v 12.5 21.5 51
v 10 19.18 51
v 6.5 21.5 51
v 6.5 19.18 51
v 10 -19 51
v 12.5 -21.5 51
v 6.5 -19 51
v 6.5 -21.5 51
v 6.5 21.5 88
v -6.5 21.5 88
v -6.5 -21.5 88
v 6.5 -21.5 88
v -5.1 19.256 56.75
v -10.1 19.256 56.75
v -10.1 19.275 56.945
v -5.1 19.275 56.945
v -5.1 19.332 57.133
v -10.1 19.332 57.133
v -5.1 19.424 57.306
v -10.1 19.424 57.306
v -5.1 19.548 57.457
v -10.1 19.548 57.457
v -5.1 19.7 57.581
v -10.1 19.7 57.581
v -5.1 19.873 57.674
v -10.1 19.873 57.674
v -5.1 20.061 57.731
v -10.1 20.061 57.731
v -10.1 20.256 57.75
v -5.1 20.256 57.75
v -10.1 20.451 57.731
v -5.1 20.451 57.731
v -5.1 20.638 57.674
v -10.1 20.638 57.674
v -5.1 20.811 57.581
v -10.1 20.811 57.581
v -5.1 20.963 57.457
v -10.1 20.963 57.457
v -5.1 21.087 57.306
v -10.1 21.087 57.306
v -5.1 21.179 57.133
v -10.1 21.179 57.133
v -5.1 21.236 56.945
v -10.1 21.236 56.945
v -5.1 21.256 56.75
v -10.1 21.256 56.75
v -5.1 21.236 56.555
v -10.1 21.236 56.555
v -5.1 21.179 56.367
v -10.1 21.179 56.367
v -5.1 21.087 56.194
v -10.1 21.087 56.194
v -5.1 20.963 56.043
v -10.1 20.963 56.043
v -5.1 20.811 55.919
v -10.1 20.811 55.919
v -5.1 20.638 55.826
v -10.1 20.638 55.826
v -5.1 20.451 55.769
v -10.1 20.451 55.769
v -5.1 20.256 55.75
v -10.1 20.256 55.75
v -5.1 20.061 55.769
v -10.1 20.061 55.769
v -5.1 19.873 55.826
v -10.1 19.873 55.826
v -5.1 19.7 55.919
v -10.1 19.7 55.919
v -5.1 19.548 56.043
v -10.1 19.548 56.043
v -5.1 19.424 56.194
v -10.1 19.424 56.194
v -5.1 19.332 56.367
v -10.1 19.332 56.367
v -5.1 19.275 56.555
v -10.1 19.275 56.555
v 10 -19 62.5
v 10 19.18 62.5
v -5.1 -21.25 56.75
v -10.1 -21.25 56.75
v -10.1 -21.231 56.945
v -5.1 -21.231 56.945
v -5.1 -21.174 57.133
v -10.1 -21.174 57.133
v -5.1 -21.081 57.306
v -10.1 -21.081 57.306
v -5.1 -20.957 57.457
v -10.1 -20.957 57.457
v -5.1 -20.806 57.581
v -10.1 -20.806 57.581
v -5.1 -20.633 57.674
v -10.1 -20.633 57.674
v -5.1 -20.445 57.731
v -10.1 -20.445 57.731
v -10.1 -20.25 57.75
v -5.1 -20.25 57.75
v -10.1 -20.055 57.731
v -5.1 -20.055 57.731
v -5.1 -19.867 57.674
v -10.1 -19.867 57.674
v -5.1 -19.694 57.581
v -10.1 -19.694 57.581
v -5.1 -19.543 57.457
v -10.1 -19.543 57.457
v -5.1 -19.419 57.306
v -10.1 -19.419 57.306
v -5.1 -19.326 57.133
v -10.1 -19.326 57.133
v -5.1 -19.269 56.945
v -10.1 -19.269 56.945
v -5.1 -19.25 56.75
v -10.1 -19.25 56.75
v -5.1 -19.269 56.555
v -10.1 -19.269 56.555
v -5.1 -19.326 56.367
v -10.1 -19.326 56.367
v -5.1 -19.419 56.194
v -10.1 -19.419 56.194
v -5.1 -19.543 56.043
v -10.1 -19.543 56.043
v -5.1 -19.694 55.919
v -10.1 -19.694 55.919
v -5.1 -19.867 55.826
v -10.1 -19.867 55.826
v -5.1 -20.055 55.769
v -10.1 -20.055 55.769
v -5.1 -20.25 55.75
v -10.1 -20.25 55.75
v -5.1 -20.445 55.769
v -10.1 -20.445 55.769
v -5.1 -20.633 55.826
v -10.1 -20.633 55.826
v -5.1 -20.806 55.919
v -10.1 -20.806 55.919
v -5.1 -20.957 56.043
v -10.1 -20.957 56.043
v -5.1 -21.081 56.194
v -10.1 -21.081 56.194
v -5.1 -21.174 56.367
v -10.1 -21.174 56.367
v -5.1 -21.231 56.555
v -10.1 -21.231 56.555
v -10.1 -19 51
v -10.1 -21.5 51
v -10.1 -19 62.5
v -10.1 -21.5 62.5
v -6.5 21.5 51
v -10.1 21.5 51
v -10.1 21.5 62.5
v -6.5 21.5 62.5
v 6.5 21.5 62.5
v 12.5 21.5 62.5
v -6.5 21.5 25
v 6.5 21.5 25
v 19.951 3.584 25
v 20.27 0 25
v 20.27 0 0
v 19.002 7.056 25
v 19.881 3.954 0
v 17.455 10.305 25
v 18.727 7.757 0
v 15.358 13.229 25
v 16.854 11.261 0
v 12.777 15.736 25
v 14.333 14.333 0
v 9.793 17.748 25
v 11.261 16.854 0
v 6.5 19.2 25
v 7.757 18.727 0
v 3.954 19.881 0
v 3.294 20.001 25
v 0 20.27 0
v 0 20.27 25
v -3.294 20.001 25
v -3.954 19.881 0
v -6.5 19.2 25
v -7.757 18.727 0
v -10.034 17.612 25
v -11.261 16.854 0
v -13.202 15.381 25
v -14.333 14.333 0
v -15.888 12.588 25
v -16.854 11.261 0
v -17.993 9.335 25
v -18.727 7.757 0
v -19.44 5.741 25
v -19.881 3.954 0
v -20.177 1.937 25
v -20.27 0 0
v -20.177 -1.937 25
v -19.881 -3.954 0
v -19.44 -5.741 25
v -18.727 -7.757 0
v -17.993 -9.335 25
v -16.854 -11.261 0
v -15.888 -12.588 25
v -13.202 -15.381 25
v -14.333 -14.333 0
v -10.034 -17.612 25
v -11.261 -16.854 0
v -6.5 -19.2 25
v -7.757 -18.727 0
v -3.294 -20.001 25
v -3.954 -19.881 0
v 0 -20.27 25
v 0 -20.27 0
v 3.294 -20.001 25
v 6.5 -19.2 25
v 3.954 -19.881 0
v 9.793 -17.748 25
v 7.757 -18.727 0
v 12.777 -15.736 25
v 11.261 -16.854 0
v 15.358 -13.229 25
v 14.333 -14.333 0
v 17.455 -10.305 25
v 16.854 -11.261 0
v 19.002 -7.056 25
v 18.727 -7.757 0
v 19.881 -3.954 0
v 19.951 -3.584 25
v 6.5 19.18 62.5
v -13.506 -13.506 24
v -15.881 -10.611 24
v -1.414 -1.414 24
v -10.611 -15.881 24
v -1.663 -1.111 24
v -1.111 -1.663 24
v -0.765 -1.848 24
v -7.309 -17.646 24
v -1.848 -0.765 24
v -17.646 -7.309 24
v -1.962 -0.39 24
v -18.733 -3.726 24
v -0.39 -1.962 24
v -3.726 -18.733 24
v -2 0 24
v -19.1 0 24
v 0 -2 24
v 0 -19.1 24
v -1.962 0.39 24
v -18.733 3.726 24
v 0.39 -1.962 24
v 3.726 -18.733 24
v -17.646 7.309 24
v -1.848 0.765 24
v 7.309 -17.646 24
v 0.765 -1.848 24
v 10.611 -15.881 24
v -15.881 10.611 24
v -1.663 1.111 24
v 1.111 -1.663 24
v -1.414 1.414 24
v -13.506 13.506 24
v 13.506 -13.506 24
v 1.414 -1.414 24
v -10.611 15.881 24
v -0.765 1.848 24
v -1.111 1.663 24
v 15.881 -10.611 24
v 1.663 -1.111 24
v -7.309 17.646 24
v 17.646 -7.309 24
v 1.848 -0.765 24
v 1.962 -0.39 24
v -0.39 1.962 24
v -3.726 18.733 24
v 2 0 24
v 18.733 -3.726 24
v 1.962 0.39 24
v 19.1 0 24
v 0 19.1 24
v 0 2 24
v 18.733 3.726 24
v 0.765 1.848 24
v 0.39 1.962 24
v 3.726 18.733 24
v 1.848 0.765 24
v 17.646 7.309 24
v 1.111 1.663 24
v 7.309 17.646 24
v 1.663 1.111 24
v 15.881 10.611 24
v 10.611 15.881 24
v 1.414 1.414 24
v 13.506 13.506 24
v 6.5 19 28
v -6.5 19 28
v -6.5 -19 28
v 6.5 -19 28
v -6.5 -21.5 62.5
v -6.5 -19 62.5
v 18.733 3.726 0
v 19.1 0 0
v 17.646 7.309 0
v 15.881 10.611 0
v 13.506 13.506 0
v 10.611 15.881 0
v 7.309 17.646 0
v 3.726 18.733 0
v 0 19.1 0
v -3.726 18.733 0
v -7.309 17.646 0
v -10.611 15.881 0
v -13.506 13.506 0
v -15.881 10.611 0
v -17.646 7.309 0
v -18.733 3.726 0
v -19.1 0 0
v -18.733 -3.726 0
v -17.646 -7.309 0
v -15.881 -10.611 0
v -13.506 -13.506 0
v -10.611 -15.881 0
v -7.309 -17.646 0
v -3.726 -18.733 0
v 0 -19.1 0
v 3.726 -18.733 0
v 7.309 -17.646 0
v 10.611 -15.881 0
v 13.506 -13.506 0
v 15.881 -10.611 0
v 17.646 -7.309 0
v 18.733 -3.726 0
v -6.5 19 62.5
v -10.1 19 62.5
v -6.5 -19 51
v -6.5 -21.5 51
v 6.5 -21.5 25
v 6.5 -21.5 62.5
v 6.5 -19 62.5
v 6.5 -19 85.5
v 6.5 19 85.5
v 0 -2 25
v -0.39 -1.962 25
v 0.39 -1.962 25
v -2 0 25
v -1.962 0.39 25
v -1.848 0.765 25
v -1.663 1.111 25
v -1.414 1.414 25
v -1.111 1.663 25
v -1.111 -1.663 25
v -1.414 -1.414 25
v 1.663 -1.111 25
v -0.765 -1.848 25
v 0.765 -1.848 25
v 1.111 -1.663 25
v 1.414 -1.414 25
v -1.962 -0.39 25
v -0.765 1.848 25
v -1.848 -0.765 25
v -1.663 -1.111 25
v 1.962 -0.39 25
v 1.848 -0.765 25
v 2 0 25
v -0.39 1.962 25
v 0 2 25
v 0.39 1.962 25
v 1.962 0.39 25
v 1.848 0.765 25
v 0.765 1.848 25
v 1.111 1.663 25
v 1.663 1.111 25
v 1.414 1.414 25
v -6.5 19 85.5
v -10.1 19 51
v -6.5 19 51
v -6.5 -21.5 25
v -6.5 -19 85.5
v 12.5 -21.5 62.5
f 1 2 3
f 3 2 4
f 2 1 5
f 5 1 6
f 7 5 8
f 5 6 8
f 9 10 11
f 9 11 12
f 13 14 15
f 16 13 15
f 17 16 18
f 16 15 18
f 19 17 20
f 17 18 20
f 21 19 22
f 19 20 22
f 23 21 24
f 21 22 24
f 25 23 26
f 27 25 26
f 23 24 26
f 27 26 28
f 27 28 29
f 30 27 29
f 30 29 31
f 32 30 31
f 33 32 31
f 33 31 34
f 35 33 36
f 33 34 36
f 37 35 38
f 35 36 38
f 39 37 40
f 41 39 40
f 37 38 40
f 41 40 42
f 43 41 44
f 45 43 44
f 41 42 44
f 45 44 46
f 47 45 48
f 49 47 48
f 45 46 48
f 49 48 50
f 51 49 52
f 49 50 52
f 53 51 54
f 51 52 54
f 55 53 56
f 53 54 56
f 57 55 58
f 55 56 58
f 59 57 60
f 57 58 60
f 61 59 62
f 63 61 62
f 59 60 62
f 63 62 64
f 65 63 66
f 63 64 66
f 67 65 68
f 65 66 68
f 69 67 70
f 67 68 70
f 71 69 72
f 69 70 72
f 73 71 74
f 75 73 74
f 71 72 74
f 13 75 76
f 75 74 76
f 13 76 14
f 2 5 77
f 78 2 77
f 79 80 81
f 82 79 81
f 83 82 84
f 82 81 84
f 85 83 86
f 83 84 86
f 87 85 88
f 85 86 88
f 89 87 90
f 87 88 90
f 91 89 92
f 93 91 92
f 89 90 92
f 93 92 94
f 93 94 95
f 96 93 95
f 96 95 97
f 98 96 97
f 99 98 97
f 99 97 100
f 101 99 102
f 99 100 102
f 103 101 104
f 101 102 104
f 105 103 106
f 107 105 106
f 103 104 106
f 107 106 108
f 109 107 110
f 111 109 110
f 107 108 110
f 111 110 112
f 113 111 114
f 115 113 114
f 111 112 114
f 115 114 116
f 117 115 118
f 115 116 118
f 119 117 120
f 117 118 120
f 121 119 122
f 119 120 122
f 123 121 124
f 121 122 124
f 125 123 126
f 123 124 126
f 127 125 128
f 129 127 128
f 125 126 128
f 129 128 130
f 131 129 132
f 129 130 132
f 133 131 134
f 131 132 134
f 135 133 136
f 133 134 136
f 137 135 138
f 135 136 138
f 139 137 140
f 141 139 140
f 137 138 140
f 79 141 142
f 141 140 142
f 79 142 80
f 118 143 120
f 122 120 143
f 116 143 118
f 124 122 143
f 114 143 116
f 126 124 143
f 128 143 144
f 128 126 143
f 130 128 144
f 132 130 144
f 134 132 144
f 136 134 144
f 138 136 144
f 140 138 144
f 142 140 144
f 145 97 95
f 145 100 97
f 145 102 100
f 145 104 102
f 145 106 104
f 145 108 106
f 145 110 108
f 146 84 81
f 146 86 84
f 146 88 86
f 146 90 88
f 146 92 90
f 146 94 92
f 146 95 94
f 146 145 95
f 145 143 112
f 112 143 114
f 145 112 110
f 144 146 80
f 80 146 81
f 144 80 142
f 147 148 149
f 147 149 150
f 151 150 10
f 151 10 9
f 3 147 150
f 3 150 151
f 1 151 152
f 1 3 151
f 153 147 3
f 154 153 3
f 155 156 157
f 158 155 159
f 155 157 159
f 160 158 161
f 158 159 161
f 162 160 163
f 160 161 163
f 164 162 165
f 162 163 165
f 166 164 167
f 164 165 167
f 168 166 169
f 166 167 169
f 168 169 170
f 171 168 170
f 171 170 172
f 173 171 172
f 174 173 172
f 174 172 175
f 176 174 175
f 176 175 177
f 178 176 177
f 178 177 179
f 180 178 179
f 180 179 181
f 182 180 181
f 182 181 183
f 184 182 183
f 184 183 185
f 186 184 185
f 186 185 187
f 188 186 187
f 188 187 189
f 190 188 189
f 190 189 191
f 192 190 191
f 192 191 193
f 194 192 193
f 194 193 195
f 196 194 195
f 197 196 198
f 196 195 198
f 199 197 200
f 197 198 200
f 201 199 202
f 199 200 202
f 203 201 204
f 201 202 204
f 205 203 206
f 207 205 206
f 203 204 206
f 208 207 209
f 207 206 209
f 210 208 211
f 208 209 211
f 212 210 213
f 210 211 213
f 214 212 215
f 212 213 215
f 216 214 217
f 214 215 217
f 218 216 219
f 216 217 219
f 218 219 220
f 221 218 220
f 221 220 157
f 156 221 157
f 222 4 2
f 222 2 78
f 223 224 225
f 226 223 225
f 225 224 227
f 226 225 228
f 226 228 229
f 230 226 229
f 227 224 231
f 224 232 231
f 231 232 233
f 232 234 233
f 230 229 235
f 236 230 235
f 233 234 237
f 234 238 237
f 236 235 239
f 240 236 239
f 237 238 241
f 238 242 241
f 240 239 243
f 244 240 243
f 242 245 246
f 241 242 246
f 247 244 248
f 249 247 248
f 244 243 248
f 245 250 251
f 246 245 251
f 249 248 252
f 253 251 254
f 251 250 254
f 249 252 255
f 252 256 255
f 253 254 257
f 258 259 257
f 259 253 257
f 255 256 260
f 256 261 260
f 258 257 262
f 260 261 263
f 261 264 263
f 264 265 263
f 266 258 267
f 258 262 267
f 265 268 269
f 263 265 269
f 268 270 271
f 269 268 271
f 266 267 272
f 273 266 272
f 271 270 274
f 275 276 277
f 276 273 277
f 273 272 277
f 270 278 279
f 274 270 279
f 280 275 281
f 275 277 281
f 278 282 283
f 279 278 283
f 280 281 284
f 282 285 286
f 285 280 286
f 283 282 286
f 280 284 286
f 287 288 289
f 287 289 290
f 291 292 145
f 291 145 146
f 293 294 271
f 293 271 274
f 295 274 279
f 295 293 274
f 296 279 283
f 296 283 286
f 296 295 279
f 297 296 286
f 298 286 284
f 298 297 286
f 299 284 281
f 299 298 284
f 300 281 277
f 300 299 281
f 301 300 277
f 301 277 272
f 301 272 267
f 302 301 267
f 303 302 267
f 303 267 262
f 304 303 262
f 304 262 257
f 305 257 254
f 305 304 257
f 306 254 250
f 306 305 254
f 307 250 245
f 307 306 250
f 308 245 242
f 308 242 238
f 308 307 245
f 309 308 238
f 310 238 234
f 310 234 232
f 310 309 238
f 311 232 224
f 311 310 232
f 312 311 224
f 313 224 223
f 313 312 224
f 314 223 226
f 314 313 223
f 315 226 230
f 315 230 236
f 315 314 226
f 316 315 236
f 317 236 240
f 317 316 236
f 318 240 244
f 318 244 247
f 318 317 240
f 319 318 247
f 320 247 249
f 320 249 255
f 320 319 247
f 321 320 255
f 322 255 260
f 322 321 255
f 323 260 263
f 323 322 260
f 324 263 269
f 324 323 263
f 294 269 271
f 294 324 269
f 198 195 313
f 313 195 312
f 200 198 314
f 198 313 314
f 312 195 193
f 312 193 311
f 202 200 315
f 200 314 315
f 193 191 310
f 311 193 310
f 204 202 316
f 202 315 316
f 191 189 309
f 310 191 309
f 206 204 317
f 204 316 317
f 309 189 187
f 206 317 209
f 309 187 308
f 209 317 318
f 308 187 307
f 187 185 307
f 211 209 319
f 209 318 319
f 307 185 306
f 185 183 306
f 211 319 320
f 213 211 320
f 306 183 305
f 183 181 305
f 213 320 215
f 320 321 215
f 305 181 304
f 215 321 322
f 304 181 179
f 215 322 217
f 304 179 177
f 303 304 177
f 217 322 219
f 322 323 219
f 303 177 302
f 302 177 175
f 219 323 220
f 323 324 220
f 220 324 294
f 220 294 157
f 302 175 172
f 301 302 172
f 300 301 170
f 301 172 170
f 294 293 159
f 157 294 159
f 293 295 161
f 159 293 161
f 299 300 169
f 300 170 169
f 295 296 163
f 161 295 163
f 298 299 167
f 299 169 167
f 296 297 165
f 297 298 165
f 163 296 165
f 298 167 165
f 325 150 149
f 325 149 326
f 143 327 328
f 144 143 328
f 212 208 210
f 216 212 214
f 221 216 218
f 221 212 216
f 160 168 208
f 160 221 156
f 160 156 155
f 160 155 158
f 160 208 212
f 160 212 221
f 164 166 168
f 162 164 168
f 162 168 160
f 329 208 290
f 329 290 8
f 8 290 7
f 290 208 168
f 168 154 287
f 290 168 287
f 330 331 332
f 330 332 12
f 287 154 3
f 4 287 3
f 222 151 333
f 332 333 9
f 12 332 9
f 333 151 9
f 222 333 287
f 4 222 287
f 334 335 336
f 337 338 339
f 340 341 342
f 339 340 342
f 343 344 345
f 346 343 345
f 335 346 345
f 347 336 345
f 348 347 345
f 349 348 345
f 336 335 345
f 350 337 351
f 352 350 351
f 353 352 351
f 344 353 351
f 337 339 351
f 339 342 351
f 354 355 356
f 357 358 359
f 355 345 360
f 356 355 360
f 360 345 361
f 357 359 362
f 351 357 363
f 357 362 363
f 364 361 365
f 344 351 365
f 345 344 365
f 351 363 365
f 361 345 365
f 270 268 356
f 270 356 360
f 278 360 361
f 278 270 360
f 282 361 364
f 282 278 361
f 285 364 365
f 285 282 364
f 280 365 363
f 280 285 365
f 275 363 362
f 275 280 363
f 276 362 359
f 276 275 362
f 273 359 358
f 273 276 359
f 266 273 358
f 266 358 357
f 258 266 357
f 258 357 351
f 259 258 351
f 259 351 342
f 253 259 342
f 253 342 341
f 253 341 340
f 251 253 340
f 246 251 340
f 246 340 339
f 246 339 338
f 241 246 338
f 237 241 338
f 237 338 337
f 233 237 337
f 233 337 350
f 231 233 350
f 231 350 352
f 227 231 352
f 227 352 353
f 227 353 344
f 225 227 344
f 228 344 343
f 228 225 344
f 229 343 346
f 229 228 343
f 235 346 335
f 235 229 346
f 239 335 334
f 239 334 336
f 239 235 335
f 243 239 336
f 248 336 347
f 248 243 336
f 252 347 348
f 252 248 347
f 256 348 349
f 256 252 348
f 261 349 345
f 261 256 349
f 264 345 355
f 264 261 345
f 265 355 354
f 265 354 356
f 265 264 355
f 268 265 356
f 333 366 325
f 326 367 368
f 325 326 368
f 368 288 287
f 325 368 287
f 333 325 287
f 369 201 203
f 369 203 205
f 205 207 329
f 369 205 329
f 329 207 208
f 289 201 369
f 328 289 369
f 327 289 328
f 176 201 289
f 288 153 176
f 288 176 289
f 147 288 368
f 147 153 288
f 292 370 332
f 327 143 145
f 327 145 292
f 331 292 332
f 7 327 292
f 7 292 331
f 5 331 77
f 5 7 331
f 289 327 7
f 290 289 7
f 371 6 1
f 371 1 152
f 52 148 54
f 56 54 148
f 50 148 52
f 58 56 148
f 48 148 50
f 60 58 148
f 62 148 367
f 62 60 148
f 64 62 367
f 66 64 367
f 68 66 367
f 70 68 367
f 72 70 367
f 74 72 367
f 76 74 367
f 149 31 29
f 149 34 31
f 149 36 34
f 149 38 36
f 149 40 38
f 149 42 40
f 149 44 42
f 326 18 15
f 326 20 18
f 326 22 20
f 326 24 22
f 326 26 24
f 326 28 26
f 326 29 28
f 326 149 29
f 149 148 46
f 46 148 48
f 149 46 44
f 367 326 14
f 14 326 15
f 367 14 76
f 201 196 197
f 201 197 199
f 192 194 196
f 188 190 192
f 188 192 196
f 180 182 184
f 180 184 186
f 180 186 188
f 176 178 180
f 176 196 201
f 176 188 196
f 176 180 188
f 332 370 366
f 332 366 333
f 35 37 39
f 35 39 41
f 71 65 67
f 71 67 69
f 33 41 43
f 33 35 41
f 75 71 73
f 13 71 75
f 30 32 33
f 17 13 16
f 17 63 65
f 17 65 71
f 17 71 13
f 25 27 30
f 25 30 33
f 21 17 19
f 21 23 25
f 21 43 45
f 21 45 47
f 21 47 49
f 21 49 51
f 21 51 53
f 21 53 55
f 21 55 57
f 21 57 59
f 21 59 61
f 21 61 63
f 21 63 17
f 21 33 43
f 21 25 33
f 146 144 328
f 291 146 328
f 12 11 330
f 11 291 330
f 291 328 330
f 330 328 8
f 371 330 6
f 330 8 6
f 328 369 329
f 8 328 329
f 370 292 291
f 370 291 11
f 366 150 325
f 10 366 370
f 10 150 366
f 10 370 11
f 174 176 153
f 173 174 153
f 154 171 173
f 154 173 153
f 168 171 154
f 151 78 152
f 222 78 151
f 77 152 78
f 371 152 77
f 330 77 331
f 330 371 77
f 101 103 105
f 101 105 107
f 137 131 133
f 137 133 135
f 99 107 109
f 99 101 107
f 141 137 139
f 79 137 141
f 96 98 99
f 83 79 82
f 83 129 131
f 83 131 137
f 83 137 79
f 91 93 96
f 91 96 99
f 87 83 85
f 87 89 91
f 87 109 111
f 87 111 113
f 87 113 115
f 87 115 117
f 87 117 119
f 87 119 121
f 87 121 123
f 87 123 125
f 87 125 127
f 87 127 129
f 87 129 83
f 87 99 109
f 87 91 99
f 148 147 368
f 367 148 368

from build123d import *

# Parameters (mm, degrees)
F0_R      = 20.2700767199
F0_R_2    = 19.1
F0_R_3    = 2
F1_DEPTH  = 25
F2_DEPTH  = 24
F3_W      = 13
F3_H      = 13
F3_R      = 2
F4_DEPTH  = 3
F5_DEPTH  = 15
F6_DEPTH  = 15
F7_W      = 13
F7_H      = 2.5
F8_DEPTH  = 60
F9_W      = 13
F9_H      = 2.5
F10_DEPTH = 40
F11_W     = 2.5
F11_H     = 11.5
F11_W_2   = 2.3203180134
F12_DEPTH = 6
F13_W     = 2.5
F13_H     = 11.5
F14_DEPTH = 40
F15_W     = 2.5
F15_H     = 11.5
F16_DEPTH = 3.6
F18_R     = 1
F17_R     = 1
F19_DEPTH = 5


with BuildPart() as f1:
    # F0 (on Top) → F1 (new body)
    with BuildSketch(Plane.XY):
        Circle(F0_R)
        Circle(F0_R_2, mode=Mode.SUBTRACT)
        Circle(F0_R_2)
        Circle(F0_R_3, mode=Mode.SUBTRACT)
    extrude(amount=F1_DEPTH)

    # F0 (on Top) → F2 (cut)
    with BuildSketch(Plane.XY):
        Circle(F0_R_2)
        Circle(F0_R_3, mode=Mode.SUBTRACT)
    extrude(amount=F2_DEPTH, mode=Mode.SUBTRACT)

    # F3 (on face) → F4 (join)
    with BuildSketch(Plane.XY.offset(25)):
        Rectangle(F3_W, F3_H)
        Circle(F3_R, mode=Mode.SUBTRACT)
        Rectangle(F3_W, F3_H)
    extrude(amount=F4_DEPTH)

    # F5 (add): a face of the model
    f5_faces = [f1.faces().sort_by_distance(p)[0] for p in [
        (0, -6.5, 26.5),
    ]]
    extrude(f5_faces, amount=F5_DEPTH)

    # F6 (add): a face of the model
    f6_faces = [f1.faces().sort_by_distance(p)[0] for p in [
        (0, 6.5, 26.5),
    ]]
    extrude(f6_faces, amount=F6_DEPTH)

    # F7 (on face) → F8 (join)
    with BuildSketch(Plane.XY.offset(28)):
        with Locations((0, -20.25)):
            Rectangle(F7_W, F7_H)
        with Locations((0, 20.25)):
            Rectangle(F7_W, F7_H)
    extrude(amount=F8_DEPTH)

    # F9 (on face) → F10 (join)
    with BuildSketch(Plane.XZ.offset(-19)):
        with Locations((0, 86.75)):
            Rectangle(F9_W, F9_H)
    extrude(amount=F10_DEPTH)

    # F11 (on face) → F12 (join)
    with BuildSketch(Plane.YZ.offset(6.5)):
        with Locations((-20.25, 56.75)):
            Rectangle(F11_W, F11_H)
        with Locations((20.3398409933, 56.75)):
            Rectangle(F11_W_2, F11_H)
    extrude(amount=F12_DEPTH)

    # F13 (on face) → F14 (join)
    with BuildSketch(Plane(origin=(0, -19, 0), x_dir=(-1, 0, 0), z_dir=(0, 1, 0))):
        with Locations((-11.25, 56.75)):
            Rectangle(F13_W, F13_H)
    extrude(amount=F14_DEPTH)

    # F15 (on face) → F16 (join)
    with BuildSketch(Plane(origin=(-6.5, 0, 0), x_dir=(0, -1, 0), z_dir=(-1, 0, 0))):
        with Locations((20.25, 56.75)):
            Rectangle(F15_W, F15_H)
        with Locations((-20.25, 56.75)):
            Rectangle(F15_W, F15_H)
    extrude(amount=F16_DEPTH)

    # F18 (on face) + F17 (on face) → F19 (cut)
    with BuildSketch(Plane(origin=(-10.1, 0, 0), x_dir=(0, -1, 0), z_dir=(-1, 0, 0))):
        with Locations((20.25, 56.75)):
            Circle(F18_R)
    with BuildSketch(Plane(origin=(-10.1, 0, 0), x_dir=(0, -1, 0), z_dir=(-1, 0, 0))):
        with Locations((-20.2555917203, 56.75)):
            Circle(F17_R)
    extrude(amount=-F19_DEPTH, mode=Mode.SUBTRACT)


solid = f1.part
